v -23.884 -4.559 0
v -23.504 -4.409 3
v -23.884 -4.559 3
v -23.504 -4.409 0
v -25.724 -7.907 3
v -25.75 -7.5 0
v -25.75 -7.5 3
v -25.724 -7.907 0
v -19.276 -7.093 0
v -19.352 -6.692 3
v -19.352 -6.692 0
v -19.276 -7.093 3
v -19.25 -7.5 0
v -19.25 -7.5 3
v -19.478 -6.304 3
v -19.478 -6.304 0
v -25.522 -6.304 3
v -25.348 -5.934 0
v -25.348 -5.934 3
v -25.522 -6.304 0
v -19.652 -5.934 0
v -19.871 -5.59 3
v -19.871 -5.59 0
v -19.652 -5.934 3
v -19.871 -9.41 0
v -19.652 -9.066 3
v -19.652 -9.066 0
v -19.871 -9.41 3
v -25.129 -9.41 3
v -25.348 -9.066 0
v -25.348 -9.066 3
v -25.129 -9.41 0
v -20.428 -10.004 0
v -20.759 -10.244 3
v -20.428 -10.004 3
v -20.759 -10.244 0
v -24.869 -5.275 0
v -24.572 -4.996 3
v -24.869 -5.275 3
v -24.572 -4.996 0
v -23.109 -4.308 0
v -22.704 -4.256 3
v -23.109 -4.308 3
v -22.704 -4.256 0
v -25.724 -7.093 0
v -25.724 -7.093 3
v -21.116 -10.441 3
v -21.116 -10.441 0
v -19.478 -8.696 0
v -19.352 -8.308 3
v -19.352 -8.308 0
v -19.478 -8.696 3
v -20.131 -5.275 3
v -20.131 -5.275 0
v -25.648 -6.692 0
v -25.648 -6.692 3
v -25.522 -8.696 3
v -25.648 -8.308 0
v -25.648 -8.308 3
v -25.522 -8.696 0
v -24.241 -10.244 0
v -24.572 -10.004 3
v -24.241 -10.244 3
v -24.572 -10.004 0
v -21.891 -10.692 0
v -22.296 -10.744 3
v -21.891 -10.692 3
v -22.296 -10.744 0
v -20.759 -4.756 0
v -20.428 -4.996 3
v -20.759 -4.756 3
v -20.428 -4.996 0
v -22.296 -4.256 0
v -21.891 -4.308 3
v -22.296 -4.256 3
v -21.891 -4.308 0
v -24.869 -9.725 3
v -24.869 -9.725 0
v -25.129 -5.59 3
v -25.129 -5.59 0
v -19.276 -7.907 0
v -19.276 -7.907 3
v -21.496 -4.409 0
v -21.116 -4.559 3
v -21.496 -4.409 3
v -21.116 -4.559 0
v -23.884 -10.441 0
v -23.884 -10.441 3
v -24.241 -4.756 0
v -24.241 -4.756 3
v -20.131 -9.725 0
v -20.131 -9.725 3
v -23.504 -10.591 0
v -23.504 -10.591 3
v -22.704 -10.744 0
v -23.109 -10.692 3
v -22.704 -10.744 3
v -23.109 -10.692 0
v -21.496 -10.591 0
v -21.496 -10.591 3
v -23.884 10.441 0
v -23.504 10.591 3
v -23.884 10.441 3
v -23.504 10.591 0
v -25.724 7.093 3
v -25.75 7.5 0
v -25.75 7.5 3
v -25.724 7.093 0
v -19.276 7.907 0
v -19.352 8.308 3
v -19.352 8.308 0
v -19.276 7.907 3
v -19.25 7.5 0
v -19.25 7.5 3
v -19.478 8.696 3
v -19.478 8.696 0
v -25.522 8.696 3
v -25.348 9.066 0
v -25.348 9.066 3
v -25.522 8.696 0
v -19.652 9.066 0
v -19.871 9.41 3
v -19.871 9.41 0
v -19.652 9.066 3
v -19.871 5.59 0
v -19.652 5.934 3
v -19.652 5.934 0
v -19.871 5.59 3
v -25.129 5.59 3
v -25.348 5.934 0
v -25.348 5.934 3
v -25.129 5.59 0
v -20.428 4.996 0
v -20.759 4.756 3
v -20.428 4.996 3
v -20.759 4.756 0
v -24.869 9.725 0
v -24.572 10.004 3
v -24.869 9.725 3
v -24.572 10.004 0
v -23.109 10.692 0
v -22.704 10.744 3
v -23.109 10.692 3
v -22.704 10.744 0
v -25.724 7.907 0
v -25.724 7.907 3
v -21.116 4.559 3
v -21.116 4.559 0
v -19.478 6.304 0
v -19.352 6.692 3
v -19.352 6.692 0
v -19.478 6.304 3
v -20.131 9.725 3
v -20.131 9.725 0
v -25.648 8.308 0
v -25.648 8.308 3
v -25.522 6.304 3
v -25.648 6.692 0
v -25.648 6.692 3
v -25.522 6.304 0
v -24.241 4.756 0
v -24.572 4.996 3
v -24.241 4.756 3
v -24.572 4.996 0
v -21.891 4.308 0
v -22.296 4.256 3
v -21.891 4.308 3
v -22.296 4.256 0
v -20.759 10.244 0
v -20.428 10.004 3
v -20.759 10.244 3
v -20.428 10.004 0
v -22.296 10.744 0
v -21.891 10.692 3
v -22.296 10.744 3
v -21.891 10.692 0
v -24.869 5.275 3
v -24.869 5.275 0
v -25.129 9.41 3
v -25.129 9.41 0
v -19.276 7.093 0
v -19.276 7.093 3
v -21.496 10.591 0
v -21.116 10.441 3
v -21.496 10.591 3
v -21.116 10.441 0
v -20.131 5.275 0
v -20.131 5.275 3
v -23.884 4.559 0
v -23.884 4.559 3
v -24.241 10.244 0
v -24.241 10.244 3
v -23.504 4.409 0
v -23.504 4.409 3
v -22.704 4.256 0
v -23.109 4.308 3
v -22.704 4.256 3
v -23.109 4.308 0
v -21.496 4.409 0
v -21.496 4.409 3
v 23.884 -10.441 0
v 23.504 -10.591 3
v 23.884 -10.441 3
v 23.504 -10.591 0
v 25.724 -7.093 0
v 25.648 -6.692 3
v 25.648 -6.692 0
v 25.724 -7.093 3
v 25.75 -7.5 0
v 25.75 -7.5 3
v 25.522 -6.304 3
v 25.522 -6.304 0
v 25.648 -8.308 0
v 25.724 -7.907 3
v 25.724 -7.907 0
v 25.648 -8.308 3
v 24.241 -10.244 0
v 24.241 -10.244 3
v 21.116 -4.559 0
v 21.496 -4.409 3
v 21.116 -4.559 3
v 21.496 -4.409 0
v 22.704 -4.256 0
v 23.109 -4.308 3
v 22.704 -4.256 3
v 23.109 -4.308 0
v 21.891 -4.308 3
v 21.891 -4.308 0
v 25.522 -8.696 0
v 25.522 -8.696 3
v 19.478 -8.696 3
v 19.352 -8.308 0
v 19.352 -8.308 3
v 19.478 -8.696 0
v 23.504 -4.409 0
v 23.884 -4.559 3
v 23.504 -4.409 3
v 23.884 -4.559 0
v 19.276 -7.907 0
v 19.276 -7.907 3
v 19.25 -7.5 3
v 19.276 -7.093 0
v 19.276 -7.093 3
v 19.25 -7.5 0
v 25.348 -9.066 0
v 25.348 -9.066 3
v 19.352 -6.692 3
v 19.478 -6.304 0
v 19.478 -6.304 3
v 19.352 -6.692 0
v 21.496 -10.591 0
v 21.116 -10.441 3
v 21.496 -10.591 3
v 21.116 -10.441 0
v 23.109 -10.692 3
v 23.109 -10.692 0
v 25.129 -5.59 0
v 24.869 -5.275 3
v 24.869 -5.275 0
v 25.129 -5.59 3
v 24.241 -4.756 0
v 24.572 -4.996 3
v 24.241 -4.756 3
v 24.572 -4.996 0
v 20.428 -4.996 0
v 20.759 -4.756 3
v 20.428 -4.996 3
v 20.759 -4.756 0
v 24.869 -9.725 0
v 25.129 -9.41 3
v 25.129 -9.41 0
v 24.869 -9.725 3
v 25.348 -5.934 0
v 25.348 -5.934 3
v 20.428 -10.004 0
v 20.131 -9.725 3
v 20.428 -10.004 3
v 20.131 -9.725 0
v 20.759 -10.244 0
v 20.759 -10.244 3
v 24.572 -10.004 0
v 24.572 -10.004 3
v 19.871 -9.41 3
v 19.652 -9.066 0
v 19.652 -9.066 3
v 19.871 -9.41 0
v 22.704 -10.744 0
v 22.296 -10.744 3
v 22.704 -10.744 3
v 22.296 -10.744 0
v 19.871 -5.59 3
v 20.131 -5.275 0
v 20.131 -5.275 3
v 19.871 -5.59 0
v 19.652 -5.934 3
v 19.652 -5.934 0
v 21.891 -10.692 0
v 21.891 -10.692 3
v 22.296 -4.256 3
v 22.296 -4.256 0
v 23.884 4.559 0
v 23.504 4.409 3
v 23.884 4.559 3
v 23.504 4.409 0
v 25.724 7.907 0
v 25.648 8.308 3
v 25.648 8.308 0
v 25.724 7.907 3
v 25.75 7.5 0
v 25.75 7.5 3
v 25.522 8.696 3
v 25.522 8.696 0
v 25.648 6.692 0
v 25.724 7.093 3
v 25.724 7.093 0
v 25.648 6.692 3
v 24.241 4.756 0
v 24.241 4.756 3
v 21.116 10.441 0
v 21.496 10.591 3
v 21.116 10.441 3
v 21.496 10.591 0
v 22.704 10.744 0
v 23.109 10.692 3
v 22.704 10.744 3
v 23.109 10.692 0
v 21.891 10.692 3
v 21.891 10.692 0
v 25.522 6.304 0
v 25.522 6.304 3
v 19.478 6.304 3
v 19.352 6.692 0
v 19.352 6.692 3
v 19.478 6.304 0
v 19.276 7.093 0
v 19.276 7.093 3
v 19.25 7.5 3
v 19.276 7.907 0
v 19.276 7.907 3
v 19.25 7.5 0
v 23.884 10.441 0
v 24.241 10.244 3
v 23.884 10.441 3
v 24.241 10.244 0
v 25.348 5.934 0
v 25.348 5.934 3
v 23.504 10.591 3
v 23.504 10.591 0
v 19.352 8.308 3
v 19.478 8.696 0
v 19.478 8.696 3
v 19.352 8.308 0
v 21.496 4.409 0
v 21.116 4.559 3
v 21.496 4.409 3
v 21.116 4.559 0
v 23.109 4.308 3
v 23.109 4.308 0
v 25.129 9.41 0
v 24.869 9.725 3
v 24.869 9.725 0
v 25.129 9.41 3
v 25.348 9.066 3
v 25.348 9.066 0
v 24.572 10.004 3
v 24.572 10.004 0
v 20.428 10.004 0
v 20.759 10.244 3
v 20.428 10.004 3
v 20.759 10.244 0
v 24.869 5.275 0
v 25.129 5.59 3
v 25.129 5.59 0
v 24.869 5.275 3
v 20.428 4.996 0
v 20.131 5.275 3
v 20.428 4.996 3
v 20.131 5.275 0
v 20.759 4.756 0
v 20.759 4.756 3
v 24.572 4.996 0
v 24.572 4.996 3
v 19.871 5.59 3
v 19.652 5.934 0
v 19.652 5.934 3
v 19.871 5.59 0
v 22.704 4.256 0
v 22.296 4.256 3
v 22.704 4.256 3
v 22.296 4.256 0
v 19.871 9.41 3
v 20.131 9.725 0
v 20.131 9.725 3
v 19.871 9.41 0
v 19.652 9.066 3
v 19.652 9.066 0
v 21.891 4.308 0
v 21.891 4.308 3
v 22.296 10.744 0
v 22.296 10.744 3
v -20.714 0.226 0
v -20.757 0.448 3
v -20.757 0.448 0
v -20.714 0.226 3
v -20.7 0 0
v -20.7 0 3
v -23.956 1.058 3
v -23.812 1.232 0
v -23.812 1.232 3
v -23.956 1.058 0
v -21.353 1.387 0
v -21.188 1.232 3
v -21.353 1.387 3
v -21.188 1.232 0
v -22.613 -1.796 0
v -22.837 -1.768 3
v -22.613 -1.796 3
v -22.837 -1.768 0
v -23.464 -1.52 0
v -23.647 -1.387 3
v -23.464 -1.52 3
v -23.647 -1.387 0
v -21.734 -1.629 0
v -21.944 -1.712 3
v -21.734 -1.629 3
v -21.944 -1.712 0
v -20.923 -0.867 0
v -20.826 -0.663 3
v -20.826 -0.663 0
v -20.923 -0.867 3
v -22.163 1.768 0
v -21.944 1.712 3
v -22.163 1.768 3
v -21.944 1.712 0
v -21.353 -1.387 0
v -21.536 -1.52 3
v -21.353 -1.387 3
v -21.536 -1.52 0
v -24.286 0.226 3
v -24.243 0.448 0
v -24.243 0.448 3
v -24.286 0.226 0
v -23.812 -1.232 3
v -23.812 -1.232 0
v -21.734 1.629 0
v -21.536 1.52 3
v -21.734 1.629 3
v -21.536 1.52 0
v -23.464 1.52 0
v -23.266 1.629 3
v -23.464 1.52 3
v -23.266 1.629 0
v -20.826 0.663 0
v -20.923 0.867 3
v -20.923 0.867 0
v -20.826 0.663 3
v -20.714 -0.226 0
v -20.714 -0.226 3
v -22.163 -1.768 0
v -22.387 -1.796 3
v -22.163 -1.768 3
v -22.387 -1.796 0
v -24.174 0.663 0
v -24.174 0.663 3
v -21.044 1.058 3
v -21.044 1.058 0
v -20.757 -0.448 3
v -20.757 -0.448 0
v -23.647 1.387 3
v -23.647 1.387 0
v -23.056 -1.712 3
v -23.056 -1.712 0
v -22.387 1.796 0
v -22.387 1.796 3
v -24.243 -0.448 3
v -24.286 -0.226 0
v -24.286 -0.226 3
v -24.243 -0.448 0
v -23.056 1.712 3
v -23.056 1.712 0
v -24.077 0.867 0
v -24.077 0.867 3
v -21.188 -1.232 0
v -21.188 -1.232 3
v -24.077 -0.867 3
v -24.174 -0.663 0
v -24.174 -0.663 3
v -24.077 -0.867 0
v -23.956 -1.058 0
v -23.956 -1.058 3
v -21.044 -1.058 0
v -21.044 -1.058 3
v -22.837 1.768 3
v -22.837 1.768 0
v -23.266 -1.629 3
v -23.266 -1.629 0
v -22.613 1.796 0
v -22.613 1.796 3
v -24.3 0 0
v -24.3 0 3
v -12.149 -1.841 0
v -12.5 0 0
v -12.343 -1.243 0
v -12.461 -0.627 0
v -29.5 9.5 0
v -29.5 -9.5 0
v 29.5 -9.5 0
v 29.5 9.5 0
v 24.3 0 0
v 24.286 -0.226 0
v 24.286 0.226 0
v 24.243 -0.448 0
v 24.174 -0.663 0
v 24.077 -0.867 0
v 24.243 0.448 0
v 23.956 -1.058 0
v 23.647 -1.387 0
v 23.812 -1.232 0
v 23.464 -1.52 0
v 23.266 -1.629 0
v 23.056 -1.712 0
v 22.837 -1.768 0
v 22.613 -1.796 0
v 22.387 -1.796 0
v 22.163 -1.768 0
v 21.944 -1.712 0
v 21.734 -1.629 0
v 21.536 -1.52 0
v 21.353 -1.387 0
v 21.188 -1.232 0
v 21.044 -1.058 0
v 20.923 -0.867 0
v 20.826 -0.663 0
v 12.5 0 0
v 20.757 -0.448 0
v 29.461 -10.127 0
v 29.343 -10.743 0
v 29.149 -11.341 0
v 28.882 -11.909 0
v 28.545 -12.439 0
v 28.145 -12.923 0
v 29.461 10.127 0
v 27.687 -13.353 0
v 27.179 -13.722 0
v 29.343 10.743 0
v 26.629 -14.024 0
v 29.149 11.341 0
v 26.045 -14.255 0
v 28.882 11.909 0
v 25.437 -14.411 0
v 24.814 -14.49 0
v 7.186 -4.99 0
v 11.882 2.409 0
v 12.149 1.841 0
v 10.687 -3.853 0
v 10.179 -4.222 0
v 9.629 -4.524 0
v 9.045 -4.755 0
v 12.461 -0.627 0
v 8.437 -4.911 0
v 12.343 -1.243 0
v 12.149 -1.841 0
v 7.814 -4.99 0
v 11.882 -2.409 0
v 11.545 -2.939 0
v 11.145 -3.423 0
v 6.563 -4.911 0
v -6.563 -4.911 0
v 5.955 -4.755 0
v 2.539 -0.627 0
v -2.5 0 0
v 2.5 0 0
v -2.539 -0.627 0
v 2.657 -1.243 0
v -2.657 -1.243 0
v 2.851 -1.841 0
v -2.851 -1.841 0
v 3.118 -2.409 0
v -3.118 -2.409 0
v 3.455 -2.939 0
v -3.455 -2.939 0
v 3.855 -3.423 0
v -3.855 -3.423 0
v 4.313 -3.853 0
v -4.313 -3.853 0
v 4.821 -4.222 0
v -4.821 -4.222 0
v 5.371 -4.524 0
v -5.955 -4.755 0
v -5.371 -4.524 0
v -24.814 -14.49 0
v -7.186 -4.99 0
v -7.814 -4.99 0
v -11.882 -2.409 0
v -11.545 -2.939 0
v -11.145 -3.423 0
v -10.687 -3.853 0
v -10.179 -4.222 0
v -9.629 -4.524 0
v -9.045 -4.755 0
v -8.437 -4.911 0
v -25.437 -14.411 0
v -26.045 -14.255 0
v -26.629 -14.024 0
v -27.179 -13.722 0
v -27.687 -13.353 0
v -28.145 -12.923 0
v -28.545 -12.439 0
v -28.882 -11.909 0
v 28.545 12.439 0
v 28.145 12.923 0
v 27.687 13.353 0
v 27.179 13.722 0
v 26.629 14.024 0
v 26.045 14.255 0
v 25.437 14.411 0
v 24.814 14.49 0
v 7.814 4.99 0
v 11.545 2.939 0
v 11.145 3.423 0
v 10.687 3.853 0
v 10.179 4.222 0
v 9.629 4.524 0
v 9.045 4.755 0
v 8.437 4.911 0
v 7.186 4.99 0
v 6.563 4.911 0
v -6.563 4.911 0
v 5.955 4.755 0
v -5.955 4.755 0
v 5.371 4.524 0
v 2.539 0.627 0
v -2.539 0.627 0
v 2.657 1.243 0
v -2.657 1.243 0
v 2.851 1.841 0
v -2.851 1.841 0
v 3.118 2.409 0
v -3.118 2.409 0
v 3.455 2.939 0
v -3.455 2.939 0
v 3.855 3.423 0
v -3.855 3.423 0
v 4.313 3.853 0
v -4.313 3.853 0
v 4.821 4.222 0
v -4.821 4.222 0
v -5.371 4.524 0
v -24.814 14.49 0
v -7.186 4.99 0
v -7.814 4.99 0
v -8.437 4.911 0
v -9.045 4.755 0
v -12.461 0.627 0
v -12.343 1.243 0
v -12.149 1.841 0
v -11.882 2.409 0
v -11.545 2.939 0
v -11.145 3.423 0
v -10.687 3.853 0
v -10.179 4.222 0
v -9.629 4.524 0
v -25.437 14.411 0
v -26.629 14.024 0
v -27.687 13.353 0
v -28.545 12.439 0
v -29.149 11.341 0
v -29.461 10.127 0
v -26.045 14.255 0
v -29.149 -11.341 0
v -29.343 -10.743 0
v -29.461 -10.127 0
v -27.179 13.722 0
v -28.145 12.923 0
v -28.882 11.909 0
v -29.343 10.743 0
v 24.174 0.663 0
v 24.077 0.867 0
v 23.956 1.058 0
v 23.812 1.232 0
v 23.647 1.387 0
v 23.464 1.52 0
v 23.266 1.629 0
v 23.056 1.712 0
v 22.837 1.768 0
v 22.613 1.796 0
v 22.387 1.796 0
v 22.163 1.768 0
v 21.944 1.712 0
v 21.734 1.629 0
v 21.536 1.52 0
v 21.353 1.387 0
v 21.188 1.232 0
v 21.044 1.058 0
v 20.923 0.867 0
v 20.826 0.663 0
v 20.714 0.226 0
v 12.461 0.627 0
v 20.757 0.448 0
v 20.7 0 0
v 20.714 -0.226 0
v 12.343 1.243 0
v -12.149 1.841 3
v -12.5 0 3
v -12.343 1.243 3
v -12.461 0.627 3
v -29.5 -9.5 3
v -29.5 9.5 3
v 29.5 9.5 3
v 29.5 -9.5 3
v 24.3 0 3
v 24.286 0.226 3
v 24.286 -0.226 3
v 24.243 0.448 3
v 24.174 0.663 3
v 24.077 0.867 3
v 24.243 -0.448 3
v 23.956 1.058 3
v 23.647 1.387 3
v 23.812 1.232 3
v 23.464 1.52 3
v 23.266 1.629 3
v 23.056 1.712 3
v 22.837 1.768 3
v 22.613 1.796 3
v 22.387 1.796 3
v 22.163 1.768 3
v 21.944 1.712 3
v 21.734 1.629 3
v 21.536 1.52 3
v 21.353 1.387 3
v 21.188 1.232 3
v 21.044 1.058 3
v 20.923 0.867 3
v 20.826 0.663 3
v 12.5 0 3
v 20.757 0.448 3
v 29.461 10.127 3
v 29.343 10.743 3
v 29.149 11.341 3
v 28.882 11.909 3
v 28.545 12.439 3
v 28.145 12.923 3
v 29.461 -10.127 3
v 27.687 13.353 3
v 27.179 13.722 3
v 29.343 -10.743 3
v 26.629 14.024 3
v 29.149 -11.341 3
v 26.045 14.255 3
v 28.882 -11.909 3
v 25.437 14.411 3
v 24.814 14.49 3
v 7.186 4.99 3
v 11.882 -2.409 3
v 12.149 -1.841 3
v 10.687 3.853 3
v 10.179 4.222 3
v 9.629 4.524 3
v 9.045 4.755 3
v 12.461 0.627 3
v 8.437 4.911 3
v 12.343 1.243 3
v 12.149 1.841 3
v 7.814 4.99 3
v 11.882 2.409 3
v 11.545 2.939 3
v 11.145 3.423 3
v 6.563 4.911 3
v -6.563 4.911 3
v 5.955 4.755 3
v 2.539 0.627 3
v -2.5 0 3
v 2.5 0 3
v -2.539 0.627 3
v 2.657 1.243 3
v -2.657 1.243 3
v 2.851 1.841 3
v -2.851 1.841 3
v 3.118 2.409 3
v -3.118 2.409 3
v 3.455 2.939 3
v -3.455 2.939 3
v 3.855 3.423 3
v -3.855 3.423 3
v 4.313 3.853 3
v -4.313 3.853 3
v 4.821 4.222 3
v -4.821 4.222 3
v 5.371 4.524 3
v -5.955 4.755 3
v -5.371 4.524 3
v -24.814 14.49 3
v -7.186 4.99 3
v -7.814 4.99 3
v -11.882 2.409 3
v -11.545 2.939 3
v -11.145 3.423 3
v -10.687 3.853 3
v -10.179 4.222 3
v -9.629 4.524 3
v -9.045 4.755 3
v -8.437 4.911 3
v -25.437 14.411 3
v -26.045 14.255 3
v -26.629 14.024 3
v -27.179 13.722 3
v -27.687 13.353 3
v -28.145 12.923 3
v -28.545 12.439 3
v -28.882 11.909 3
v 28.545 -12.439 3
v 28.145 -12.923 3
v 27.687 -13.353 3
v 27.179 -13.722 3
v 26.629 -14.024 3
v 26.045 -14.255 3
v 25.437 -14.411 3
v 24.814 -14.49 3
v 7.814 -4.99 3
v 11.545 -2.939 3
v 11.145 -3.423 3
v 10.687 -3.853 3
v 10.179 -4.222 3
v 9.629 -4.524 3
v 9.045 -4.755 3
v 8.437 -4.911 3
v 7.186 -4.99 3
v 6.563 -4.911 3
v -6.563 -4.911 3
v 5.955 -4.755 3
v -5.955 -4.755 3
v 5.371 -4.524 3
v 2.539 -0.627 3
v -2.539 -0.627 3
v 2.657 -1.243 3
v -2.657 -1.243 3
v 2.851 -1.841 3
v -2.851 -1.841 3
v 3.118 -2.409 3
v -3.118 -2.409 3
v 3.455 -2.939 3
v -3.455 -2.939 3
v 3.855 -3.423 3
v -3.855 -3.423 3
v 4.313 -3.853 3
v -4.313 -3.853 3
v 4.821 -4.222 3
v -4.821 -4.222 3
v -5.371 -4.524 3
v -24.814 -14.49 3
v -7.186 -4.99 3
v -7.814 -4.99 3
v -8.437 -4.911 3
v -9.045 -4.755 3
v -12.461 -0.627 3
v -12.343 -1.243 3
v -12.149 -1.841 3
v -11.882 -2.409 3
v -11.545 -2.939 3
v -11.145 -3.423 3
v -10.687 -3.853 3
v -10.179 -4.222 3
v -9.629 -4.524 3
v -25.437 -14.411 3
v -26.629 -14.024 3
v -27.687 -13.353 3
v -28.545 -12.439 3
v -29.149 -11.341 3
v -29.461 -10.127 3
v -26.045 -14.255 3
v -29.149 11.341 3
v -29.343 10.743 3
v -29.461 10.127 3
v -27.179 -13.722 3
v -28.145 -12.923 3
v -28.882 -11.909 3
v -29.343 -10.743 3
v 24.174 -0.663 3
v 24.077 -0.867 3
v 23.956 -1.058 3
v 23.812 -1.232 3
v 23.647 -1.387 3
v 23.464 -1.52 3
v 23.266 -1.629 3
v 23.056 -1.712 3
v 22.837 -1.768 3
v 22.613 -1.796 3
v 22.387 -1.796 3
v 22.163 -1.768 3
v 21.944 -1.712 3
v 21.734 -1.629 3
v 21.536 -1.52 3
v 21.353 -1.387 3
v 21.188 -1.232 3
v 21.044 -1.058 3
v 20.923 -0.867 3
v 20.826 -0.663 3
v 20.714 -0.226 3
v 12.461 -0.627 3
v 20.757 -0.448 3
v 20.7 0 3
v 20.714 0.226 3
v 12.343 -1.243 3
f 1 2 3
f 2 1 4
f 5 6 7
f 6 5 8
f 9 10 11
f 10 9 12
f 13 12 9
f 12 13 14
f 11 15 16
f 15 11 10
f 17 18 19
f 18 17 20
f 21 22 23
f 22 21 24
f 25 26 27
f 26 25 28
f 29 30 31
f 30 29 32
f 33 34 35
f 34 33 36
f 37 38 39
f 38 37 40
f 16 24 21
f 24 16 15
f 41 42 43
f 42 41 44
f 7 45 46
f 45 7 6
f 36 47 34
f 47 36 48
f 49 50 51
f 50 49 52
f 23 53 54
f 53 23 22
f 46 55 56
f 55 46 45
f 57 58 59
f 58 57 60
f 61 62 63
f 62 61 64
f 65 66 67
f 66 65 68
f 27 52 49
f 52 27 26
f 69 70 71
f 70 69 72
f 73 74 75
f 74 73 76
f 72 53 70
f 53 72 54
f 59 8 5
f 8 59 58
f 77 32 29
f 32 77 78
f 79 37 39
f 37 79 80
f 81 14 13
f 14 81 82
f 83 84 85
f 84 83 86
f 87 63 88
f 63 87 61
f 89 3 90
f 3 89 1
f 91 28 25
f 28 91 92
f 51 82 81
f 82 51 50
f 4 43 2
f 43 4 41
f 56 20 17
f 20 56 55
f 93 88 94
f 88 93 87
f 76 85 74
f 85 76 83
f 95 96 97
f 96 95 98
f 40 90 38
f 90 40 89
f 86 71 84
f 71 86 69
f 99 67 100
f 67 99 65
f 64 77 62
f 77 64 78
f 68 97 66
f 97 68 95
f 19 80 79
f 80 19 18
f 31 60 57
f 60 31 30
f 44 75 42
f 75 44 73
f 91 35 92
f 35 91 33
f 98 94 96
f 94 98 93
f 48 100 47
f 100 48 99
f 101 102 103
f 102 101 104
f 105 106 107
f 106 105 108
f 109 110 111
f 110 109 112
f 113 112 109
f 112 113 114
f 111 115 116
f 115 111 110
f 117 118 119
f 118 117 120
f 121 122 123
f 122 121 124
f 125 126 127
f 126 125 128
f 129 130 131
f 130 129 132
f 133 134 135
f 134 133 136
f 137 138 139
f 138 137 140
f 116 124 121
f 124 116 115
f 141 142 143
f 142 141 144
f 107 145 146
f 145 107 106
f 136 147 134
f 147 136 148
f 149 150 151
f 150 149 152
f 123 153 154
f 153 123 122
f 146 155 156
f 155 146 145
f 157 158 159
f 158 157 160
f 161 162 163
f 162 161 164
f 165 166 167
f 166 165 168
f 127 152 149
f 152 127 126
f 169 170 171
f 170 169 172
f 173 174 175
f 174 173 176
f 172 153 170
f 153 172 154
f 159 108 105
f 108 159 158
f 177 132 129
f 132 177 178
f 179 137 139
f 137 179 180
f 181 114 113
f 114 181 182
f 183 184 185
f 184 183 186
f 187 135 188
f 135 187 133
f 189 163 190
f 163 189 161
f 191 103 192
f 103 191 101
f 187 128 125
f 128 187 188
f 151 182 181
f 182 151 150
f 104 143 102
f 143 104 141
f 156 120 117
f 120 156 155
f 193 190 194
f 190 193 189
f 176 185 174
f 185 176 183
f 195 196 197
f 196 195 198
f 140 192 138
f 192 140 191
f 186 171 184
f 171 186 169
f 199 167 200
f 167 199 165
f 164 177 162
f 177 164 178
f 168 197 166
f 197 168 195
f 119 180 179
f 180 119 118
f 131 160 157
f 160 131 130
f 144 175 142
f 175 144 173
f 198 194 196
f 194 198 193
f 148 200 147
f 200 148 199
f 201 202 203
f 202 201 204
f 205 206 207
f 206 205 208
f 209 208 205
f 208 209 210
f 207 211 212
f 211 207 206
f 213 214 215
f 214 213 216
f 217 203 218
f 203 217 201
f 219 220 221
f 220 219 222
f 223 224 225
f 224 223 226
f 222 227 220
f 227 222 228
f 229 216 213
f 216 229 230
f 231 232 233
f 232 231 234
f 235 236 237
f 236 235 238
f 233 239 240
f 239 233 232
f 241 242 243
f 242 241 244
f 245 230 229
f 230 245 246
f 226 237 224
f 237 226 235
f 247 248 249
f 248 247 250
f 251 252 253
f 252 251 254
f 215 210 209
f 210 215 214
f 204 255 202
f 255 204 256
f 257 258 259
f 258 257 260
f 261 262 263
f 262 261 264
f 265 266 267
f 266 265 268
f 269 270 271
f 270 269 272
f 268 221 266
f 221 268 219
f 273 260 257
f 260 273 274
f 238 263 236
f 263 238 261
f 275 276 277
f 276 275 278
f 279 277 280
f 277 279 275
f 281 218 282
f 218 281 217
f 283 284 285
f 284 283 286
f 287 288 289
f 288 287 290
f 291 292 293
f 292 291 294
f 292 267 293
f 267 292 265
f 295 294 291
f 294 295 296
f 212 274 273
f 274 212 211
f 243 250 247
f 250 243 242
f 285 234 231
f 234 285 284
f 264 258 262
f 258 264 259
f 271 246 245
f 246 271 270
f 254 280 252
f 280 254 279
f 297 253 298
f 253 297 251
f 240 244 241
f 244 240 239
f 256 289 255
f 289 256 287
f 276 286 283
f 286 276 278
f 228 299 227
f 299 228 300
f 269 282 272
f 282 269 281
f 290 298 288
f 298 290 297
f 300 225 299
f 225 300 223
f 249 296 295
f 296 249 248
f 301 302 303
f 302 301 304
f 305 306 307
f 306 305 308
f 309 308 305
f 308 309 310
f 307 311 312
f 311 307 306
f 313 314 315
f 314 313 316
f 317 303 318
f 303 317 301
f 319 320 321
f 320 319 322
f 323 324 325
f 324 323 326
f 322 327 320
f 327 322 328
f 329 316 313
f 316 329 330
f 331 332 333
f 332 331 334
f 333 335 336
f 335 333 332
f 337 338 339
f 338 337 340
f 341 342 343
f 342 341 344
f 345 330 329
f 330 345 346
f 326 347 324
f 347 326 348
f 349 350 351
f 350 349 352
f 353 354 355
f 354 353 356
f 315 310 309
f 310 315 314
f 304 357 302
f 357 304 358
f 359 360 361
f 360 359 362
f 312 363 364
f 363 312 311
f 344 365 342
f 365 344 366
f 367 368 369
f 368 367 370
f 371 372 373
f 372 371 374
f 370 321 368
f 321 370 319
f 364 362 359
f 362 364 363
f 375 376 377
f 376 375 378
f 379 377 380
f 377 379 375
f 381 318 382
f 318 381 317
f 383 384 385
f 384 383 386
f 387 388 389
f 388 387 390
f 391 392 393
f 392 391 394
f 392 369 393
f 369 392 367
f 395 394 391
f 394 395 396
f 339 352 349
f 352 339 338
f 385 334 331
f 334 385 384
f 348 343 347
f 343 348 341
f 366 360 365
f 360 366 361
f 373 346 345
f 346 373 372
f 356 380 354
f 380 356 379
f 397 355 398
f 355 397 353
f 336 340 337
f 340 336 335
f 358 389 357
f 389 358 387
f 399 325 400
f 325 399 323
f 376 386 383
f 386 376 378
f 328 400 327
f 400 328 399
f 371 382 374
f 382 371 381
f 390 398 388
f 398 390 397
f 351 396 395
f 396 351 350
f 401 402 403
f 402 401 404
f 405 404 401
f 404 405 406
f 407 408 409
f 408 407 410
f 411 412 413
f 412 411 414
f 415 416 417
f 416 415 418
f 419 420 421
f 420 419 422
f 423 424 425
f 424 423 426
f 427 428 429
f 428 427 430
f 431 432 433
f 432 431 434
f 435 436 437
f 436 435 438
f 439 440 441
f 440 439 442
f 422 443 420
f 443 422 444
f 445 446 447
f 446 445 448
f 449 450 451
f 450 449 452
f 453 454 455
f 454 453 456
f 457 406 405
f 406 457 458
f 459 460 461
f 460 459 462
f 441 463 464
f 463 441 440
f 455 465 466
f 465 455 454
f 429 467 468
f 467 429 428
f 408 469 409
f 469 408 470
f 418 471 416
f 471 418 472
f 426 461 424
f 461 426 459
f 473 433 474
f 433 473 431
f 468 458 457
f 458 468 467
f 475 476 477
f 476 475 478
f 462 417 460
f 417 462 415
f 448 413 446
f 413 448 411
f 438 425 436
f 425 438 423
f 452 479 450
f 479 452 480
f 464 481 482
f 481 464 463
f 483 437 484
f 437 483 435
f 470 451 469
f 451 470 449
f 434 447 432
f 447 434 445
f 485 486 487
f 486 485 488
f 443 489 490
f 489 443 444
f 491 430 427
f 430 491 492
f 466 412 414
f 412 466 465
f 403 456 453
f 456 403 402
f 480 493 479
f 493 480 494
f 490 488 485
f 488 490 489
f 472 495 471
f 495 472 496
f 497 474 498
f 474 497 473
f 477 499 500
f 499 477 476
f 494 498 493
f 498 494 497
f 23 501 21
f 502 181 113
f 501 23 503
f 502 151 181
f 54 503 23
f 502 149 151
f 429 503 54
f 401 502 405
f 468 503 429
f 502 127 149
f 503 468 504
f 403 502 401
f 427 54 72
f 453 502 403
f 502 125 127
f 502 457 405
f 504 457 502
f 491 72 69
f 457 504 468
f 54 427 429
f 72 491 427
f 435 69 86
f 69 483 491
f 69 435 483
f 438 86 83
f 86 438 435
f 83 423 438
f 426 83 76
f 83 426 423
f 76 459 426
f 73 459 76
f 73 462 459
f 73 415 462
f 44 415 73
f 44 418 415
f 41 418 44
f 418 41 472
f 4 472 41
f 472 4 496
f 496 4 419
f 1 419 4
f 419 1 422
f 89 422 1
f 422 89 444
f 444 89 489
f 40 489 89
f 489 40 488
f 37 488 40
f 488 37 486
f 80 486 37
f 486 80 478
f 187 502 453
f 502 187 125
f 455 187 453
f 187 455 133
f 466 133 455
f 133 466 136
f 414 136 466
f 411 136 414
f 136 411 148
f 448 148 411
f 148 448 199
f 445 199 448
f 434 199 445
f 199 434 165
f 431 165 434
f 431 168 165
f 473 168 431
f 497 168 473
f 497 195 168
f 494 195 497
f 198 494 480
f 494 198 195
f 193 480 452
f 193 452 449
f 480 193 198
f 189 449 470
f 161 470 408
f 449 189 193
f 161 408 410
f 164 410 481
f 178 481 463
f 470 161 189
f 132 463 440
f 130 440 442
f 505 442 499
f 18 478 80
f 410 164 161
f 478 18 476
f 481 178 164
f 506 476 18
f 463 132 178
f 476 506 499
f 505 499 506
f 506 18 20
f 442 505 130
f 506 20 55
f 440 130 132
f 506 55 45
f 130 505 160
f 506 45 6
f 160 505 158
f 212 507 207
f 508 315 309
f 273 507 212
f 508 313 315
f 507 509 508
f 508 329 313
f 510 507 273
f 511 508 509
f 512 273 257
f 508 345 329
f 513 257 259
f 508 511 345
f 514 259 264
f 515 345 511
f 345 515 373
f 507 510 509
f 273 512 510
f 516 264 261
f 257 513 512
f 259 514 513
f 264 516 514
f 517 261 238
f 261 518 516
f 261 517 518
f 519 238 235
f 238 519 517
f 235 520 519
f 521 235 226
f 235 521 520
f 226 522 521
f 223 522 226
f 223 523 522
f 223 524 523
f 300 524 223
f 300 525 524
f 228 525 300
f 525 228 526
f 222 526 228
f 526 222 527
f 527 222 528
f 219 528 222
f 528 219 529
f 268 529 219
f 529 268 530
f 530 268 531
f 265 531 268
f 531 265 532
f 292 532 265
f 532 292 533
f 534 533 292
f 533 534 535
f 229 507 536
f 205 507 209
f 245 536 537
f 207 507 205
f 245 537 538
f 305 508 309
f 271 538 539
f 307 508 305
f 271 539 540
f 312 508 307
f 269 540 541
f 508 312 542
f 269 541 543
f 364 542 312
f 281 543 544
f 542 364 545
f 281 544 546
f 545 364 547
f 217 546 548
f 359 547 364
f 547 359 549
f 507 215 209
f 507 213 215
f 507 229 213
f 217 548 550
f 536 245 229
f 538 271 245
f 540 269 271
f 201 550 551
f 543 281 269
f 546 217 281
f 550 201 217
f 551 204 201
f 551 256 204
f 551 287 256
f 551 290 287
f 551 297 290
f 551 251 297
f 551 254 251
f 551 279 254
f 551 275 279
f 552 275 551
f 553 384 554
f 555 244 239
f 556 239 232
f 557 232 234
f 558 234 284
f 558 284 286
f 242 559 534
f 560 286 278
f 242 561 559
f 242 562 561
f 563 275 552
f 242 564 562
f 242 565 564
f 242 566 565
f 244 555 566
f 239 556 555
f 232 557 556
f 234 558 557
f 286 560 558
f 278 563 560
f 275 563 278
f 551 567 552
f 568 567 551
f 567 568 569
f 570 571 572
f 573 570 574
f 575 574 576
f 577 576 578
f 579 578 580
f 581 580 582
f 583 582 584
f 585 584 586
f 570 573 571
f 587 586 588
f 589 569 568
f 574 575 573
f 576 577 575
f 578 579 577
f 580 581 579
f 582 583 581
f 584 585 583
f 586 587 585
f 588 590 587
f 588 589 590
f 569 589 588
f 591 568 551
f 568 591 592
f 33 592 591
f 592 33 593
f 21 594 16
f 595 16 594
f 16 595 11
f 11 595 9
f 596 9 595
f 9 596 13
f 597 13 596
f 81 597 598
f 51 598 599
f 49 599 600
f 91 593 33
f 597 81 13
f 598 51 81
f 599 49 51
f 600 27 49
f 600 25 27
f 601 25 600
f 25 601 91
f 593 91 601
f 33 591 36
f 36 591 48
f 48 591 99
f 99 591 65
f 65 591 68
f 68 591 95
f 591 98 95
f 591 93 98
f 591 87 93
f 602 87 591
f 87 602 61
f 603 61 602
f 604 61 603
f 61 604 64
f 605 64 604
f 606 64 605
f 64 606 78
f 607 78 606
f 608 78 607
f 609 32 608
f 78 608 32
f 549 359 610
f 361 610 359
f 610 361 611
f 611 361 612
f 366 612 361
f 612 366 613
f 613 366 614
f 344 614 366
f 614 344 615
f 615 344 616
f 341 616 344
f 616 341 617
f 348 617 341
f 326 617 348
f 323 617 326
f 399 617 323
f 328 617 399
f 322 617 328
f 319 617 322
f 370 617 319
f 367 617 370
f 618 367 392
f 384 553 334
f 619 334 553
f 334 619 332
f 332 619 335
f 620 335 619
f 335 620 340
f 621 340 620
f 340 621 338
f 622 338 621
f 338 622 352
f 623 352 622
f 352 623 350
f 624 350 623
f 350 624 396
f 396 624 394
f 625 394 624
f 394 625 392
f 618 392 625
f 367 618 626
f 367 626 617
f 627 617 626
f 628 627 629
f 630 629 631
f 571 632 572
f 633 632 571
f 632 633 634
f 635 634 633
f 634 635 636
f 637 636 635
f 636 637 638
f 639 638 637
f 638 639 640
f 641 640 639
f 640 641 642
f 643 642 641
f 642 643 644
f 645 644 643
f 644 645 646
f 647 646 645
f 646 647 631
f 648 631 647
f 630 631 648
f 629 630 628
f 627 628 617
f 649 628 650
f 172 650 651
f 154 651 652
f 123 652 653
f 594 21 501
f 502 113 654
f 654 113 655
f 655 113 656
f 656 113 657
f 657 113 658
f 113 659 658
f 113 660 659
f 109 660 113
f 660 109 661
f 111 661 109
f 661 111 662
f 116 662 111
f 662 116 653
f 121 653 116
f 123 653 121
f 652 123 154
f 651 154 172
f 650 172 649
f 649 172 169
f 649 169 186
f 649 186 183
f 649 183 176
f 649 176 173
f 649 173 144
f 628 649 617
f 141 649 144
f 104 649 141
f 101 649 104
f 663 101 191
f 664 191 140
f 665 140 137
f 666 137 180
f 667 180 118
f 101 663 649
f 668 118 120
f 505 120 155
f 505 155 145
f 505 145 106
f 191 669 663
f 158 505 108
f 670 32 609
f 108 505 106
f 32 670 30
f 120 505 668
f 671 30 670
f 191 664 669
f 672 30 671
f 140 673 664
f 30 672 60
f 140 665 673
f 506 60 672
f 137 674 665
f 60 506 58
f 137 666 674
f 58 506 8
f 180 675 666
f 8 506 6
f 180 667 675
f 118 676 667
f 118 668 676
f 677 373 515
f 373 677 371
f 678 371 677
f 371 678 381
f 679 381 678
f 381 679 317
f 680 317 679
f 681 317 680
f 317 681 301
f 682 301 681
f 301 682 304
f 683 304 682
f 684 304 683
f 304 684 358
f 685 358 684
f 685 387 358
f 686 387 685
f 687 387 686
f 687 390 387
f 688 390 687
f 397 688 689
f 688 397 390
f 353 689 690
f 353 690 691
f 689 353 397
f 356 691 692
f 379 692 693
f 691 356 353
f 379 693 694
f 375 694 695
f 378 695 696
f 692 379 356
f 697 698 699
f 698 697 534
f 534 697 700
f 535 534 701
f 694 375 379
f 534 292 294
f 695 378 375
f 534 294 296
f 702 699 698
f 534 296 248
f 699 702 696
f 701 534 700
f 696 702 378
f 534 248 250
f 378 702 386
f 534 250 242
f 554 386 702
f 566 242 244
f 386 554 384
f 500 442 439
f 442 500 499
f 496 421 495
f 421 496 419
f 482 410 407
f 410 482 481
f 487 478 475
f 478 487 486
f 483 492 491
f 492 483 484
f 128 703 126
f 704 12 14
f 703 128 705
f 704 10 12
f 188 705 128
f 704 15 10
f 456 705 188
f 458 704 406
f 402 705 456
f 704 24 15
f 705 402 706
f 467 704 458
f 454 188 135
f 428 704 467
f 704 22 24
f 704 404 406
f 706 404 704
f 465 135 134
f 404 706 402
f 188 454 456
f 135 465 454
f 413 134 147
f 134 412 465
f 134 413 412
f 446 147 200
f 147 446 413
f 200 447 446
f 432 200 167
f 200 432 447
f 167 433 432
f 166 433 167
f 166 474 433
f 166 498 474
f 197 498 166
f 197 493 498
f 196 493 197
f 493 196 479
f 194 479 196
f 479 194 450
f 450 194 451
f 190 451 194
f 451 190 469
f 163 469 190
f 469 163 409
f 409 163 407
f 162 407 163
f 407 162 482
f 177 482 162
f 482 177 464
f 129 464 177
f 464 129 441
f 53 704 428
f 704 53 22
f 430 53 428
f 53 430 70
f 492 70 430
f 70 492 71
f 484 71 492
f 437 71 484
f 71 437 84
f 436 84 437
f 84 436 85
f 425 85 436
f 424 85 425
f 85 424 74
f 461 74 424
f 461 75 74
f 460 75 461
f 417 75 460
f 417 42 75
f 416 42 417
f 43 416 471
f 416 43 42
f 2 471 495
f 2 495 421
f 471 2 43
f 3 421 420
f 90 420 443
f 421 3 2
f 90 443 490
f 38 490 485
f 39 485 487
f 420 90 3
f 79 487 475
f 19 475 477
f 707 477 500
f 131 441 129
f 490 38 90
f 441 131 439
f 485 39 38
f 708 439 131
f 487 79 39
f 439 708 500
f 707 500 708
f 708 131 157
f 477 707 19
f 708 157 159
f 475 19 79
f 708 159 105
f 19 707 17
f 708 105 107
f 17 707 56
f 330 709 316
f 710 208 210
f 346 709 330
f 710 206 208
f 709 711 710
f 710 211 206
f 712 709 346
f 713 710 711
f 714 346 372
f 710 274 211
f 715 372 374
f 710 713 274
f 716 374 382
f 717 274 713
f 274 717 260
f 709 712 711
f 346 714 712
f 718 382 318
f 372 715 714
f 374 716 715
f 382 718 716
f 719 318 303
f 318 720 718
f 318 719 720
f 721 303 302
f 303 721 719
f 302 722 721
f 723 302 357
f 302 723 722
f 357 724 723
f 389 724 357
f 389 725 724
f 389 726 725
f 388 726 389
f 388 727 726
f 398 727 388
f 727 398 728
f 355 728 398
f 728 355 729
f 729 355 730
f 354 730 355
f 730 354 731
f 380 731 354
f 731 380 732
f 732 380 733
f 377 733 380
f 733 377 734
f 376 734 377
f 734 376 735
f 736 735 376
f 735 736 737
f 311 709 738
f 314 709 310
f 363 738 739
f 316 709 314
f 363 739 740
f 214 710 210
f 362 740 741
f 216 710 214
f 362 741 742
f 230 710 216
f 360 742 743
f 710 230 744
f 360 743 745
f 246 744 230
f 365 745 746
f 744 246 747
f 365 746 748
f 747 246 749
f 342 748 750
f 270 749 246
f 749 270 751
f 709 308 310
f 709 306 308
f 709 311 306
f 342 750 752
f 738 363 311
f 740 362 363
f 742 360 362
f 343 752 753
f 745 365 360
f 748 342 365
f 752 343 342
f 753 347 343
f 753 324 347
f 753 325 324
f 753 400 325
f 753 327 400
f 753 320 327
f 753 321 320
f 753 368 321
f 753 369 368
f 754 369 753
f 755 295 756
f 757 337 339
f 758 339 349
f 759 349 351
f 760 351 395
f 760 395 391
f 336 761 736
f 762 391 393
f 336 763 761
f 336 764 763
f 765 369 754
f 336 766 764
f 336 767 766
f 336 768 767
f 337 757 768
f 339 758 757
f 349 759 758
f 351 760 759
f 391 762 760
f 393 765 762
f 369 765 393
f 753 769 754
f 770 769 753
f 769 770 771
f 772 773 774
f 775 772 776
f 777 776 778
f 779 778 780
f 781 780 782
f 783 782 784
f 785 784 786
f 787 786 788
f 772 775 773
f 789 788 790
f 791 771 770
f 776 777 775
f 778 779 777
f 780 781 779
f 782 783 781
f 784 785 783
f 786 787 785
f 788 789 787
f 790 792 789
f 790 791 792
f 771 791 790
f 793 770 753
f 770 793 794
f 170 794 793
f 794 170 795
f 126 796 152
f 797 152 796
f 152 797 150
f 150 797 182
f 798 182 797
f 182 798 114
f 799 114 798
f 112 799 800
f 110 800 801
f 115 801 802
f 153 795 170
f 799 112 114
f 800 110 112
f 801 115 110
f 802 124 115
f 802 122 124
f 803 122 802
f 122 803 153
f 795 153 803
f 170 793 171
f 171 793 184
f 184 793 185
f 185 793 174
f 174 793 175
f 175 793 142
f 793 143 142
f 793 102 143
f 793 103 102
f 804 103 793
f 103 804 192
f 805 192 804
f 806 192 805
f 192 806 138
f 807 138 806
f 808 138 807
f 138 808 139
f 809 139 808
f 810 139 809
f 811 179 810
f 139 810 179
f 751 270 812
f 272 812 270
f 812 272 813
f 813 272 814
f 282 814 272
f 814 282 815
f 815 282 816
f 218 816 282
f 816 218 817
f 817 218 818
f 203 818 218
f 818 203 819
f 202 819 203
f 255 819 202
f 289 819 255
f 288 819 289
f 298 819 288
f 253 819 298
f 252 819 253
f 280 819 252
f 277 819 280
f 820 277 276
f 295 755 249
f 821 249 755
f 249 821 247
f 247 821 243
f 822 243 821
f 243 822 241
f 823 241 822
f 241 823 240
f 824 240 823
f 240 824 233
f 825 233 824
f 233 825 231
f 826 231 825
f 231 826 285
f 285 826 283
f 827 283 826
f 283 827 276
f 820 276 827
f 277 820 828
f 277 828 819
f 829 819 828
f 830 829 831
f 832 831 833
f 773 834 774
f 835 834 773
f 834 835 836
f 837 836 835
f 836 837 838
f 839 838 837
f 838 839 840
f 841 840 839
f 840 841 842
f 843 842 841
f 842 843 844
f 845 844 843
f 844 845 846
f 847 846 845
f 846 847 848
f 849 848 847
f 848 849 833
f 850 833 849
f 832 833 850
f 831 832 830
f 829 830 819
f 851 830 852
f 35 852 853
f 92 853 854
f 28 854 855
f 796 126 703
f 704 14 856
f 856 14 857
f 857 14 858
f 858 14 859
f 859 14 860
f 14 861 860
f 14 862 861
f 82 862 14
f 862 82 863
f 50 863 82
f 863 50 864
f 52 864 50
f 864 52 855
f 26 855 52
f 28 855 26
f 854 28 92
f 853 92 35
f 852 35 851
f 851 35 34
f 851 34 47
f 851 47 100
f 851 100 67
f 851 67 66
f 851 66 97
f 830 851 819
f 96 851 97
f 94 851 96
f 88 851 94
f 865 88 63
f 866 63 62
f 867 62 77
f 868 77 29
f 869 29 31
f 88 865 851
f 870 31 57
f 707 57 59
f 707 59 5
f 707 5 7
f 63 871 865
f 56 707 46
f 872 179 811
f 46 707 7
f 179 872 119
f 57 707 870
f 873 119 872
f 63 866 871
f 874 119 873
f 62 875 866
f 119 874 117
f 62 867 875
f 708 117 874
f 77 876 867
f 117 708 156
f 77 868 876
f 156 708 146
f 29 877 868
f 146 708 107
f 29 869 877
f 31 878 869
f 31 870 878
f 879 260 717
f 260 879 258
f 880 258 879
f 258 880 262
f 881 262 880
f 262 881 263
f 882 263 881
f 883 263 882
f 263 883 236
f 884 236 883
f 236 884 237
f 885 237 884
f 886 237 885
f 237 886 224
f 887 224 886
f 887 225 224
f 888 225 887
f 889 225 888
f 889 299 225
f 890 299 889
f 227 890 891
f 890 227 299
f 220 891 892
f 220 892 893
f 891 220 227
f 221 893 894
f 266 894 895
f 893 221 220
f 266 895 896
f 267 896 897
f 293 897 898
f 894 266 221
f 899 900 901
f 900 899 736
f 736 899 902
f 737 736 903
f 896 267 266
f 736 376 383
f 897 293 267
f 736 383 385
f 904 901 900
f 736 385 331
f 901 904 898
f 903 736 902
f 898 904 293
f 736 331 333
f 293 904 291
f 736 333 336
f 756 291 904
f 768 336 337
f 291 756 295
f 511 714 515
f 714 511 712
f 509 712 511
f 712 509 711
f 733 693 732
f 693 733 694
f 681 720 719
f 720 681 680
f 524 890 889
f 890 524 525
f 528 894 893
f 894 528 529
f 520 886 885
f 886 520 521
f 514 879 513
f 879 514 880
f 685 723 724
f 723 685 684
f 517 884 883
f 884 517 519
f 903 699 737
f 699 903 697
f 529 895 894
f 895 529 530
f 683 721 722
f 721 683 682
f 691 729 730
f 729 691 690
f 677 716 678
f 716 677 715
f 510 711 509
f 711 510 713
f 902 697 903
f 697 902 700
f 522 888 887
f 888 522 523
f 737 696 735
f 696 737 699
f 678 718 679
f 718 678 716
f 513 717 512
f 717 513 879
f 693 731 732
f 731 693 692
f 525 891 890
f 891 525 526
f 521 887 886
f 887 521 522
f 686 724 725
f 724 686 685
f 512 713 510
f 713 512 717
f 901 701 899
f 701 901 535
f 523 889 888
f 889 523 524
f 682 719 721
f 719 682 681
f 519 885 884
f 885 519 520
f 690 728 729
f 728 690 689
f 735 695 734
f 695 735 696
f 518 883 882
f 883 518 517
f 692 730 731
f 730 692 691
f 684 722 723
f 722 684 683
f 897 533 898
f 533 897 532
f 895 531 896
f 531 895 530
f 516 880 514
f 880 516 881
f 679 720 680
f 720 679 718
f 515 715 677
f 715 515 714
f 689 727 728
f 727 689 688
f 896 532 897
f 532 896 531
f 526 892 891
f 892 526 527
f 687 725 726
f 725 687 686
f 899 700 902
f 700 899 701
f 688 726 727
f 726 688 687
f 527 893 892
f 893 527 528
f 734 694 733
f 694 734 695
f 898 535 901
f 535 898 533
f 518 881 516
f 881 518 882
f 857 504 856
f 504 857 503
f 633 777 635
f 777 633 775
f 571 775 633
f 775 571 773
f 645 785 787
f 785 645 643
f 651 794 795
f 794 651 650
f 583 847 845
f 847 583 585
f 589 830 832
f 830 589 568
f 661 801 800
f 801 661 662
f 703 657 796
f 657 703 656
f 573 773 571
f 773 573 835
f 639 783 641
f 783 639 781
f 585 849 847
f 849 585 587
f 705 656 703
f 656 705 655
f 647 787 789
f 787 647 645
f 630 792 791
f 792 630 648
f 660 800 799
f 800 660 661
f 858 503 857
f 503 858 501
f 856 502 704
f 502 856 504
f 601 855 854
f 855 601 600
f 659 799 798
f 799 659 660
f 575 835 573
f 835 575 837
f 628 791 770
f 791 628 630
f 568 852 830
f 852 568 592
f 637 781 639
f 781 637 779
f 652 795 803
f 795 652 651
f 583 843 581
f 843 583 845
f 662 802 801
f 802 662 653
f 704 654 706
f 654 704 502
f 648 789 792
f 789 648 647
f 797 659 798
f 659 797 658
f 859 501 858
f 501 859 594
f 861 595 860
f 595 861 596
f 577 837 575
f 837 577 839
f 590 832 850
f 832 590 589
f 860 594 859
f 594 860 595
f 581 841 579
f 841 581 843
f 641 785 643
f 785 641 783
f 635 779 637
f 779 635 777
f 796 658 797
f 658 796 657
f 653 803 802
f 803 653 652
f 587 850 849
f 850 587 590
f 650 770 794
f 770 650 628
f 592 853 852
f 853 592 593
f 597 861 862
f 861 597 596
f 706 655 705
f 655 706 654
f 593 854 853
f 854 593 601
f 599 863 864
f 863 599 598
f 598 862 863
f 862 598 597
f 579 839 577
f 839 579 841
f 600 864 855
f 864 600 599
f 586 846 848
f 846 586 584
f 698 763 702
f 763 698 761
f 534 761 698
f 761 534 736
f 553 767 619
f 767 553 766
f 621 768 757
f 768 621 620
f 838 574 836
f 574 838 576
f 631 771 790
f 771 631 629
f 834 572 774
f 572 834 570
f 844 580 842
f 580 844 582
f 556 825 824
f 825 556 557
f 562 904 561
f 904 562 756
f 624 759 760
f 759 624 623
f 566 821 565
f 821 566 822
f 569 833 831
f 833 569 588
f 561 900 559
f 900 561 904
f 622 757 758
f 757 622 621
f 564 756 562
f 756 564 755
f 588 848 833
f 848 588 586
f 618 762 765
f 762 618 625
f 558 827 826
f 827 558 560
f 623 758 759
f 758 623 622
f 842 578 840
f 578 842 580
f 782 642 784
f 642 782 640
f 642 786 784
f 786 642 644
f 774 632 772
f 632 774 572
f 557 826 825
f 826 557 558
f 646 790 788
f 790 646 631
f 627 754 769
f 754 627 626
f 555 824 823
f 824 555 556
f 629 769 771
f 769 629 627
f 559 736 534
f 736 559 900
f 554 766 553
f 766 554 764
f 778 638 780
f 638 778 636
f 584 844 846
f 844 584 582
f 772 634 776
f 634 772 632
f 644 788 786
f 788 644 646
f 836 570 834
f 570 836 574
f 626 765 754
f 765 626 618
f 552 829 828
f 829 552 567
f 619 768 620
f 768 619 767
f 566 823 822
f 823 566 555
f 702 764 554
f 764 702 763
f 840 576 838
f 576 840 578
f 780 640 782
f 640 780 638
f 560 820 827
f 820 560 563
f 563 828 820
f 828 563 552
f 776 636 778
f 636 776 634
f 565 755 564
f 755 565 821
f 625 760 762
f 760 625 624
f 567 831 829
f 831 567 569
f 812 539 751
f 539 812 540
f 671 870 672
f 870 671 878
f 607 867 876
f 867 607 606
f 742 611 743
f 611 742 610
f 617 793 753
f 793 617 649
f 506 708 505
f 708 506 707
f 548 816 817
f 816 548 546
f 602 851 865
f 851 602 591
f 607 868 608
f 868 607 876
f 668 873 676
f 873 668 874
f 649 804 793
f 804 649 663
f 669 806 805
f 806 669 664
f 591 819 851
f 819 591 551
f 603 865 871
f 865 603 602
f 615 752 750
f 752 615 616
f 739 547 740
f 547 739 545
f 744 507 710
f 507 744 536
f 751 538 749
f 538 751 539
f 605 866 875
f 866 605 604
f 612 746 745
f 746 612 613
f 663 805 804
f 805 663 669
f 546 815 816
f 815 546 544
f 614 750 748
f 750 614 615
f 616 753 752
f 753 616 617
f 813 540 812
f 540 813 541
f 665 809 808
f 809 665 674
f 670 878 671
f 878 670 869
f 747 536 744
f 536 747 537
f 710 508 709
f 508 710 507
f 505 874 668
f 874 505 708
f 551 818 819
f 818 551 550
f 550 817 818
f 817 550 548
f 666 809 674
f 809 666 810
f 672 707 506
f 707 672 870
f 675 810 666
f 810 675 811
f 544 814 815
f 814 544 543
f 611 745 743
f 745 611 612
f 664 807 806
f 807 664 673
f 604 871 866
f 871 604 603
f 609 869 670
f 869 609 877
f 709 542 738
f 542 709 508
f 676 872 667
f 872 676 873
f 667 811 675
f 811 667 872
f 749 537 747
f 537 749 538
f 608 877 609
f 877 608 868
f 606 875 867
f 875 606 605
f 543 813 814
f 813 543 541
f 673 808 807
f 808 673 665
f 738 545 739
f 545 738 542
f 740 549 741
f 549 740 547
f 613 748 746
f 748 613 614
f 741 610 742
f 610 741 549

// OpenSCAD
$fn = 50;


difference() {
	union() {
		hull() {
			translate(v = [-24.5000000000, 9.5000000000, 0]) {
				cylinder(h = 3, r = 5);
			}
			translate(v = [24.5000000000, 9.5000000000, 0]) {
				cylinder(h = 3, r = 5);
			}
			translate(v = [-24.5000000000, -9.5000000000, 0]) {
				cylinder(h = 3, r = 5);
			}
			translate(v = [24.5000000000, -9.5000000000, 0]) {
				cylinder(h = 3, r = 5);
			}
		}
	}
	union() {
		#translate(v = [-22.5000000000, -7.5000000000, 0]) {
			cylinder(h = 3, r = 3.2500000000);
		}
		#translate(v = [-22.5000000000, 7.5000000000, 0]) {
			cylinder(h = 3, r = 3.2500000000);
		}
		#translate(v = [22.5000000000, -7.5000000000, 0]) {
			cylinder(h = 3, r = 3.2500000000);
		}
		#translate(v = [22.5000000000, 7.5000000000, 0]) {
			cylinder(h = 3, r = 3.2500000000);
		}
		#translate(v = [-22.5000000000, -7.5000000000, -100.0000000000]) {
			cylinder(h = 200, r = 3.2500000000);
		}
		#translate(v = [-22.5000000000, 7.5000000000, -100.0000000000]) {
			cylinder(h = 200, r = 3.2500000000);
		}
		#translate(v = [22.5000000000, -7.5000000000, -100.0000000000]) {
			cylinder(h = 200, r = 3.2500000000);
		}
		#translate(v = [22.5000000000, 7.5000000000, -100.0000000000]) {
			cylinder(h = 200, r = 3.2500000000);
		}
		#translate(v = [-22.5000000000, -7.5000000000, 0]) {
			cylinder(h = 3, r = 1.8000000000);
		}
		#translate(v = [-22.5000000000, 0.0000000000, 0]) {
			cylinder(h = 3, r = 1.8000000000);
		}
		#translate(v = [-22.5000000000, 7.5000000000, 0]) {
			cylinder(h = 3, r = 1.8000000000);
		}
		#translate(v = [22.5000000000, -7.5000000000, 0]) {
			cylinder(h = 3, r = 1.8000000000);
		}
		#translate(v = [22.5000000000, 0.0000000000, 0]) {
			cylinder(h = 3, r = 1.8000000000);
		}
		#translate(v = [22.5000000000, 7.5000000000, 0]) {
			cylinder(h = 3, r = 1.8000000000);
		}
		#translate(v = [-22.5000000000, -7.5000000000, 0]) {
			cylinder(h = 3, r = 1.8000000000);
		}
		#translate(v = [-22.5000000000, 0.0000000000, 0]) {
			cylinder(h = 3, r = 1.8000000000);
		}
		#translate(v = [-22.5000000000, 7.5000000000, 0]) {
			cylinder(h = 3, r = 1.8000000000);
		}
		#translate(v = [22.5000000000, -7.5000000000, 0]) {
			cylinder(h = 3, r = 1.8000000000);
		}
		#translate(v = [22.5000000000, 0.0000000000, 0]) {
			cylinder(h = 3, r = 1.8000000000);
		}
		#translate(v = [22.5000000000, 7.5000000000, 0]) {
			cylinder(h = 3, r = 1.8000000000);
		}
		#translate(v = [-22.5000000000, -7.5000000000, 0]) {
			cylinder(h = 3, r = 1.8000000000);
		}
		#translate(v = [-22.5000000000, 0.0000000000, 0]) {
			cylinder(h = 3, r = 1.8000000000);
		}
		#translate(v = [-22.5000000000, 7.5000000000, 0]) {
			cylinder(h = 3, r = 1.8000000000);
		}
		#translate(v = [22.5000000000, -7.5000000000, 0]) {
			cylinder(h = 3, r = 1.8000000000);
		}
		#translate(v = [22.5000000000, 0.0000000000, 0]) {
			cylinder(h = 3, r = 1.8000000000);
		}
		#translate(v = [22.5000000000, 7.5000000000, 0]) {
			cylinder(h = 3, r = 1.8000000000);
		}
		#translate(v = [-7.5000000000, 0, 0]) {
			cylinder(h = 3, r = 5.0000000000);
		}
		#translate(v = [7.5000000000, 0, 0]) {
			cylinder(h = 3, r = 5.0000000000);
		}
	}
}
